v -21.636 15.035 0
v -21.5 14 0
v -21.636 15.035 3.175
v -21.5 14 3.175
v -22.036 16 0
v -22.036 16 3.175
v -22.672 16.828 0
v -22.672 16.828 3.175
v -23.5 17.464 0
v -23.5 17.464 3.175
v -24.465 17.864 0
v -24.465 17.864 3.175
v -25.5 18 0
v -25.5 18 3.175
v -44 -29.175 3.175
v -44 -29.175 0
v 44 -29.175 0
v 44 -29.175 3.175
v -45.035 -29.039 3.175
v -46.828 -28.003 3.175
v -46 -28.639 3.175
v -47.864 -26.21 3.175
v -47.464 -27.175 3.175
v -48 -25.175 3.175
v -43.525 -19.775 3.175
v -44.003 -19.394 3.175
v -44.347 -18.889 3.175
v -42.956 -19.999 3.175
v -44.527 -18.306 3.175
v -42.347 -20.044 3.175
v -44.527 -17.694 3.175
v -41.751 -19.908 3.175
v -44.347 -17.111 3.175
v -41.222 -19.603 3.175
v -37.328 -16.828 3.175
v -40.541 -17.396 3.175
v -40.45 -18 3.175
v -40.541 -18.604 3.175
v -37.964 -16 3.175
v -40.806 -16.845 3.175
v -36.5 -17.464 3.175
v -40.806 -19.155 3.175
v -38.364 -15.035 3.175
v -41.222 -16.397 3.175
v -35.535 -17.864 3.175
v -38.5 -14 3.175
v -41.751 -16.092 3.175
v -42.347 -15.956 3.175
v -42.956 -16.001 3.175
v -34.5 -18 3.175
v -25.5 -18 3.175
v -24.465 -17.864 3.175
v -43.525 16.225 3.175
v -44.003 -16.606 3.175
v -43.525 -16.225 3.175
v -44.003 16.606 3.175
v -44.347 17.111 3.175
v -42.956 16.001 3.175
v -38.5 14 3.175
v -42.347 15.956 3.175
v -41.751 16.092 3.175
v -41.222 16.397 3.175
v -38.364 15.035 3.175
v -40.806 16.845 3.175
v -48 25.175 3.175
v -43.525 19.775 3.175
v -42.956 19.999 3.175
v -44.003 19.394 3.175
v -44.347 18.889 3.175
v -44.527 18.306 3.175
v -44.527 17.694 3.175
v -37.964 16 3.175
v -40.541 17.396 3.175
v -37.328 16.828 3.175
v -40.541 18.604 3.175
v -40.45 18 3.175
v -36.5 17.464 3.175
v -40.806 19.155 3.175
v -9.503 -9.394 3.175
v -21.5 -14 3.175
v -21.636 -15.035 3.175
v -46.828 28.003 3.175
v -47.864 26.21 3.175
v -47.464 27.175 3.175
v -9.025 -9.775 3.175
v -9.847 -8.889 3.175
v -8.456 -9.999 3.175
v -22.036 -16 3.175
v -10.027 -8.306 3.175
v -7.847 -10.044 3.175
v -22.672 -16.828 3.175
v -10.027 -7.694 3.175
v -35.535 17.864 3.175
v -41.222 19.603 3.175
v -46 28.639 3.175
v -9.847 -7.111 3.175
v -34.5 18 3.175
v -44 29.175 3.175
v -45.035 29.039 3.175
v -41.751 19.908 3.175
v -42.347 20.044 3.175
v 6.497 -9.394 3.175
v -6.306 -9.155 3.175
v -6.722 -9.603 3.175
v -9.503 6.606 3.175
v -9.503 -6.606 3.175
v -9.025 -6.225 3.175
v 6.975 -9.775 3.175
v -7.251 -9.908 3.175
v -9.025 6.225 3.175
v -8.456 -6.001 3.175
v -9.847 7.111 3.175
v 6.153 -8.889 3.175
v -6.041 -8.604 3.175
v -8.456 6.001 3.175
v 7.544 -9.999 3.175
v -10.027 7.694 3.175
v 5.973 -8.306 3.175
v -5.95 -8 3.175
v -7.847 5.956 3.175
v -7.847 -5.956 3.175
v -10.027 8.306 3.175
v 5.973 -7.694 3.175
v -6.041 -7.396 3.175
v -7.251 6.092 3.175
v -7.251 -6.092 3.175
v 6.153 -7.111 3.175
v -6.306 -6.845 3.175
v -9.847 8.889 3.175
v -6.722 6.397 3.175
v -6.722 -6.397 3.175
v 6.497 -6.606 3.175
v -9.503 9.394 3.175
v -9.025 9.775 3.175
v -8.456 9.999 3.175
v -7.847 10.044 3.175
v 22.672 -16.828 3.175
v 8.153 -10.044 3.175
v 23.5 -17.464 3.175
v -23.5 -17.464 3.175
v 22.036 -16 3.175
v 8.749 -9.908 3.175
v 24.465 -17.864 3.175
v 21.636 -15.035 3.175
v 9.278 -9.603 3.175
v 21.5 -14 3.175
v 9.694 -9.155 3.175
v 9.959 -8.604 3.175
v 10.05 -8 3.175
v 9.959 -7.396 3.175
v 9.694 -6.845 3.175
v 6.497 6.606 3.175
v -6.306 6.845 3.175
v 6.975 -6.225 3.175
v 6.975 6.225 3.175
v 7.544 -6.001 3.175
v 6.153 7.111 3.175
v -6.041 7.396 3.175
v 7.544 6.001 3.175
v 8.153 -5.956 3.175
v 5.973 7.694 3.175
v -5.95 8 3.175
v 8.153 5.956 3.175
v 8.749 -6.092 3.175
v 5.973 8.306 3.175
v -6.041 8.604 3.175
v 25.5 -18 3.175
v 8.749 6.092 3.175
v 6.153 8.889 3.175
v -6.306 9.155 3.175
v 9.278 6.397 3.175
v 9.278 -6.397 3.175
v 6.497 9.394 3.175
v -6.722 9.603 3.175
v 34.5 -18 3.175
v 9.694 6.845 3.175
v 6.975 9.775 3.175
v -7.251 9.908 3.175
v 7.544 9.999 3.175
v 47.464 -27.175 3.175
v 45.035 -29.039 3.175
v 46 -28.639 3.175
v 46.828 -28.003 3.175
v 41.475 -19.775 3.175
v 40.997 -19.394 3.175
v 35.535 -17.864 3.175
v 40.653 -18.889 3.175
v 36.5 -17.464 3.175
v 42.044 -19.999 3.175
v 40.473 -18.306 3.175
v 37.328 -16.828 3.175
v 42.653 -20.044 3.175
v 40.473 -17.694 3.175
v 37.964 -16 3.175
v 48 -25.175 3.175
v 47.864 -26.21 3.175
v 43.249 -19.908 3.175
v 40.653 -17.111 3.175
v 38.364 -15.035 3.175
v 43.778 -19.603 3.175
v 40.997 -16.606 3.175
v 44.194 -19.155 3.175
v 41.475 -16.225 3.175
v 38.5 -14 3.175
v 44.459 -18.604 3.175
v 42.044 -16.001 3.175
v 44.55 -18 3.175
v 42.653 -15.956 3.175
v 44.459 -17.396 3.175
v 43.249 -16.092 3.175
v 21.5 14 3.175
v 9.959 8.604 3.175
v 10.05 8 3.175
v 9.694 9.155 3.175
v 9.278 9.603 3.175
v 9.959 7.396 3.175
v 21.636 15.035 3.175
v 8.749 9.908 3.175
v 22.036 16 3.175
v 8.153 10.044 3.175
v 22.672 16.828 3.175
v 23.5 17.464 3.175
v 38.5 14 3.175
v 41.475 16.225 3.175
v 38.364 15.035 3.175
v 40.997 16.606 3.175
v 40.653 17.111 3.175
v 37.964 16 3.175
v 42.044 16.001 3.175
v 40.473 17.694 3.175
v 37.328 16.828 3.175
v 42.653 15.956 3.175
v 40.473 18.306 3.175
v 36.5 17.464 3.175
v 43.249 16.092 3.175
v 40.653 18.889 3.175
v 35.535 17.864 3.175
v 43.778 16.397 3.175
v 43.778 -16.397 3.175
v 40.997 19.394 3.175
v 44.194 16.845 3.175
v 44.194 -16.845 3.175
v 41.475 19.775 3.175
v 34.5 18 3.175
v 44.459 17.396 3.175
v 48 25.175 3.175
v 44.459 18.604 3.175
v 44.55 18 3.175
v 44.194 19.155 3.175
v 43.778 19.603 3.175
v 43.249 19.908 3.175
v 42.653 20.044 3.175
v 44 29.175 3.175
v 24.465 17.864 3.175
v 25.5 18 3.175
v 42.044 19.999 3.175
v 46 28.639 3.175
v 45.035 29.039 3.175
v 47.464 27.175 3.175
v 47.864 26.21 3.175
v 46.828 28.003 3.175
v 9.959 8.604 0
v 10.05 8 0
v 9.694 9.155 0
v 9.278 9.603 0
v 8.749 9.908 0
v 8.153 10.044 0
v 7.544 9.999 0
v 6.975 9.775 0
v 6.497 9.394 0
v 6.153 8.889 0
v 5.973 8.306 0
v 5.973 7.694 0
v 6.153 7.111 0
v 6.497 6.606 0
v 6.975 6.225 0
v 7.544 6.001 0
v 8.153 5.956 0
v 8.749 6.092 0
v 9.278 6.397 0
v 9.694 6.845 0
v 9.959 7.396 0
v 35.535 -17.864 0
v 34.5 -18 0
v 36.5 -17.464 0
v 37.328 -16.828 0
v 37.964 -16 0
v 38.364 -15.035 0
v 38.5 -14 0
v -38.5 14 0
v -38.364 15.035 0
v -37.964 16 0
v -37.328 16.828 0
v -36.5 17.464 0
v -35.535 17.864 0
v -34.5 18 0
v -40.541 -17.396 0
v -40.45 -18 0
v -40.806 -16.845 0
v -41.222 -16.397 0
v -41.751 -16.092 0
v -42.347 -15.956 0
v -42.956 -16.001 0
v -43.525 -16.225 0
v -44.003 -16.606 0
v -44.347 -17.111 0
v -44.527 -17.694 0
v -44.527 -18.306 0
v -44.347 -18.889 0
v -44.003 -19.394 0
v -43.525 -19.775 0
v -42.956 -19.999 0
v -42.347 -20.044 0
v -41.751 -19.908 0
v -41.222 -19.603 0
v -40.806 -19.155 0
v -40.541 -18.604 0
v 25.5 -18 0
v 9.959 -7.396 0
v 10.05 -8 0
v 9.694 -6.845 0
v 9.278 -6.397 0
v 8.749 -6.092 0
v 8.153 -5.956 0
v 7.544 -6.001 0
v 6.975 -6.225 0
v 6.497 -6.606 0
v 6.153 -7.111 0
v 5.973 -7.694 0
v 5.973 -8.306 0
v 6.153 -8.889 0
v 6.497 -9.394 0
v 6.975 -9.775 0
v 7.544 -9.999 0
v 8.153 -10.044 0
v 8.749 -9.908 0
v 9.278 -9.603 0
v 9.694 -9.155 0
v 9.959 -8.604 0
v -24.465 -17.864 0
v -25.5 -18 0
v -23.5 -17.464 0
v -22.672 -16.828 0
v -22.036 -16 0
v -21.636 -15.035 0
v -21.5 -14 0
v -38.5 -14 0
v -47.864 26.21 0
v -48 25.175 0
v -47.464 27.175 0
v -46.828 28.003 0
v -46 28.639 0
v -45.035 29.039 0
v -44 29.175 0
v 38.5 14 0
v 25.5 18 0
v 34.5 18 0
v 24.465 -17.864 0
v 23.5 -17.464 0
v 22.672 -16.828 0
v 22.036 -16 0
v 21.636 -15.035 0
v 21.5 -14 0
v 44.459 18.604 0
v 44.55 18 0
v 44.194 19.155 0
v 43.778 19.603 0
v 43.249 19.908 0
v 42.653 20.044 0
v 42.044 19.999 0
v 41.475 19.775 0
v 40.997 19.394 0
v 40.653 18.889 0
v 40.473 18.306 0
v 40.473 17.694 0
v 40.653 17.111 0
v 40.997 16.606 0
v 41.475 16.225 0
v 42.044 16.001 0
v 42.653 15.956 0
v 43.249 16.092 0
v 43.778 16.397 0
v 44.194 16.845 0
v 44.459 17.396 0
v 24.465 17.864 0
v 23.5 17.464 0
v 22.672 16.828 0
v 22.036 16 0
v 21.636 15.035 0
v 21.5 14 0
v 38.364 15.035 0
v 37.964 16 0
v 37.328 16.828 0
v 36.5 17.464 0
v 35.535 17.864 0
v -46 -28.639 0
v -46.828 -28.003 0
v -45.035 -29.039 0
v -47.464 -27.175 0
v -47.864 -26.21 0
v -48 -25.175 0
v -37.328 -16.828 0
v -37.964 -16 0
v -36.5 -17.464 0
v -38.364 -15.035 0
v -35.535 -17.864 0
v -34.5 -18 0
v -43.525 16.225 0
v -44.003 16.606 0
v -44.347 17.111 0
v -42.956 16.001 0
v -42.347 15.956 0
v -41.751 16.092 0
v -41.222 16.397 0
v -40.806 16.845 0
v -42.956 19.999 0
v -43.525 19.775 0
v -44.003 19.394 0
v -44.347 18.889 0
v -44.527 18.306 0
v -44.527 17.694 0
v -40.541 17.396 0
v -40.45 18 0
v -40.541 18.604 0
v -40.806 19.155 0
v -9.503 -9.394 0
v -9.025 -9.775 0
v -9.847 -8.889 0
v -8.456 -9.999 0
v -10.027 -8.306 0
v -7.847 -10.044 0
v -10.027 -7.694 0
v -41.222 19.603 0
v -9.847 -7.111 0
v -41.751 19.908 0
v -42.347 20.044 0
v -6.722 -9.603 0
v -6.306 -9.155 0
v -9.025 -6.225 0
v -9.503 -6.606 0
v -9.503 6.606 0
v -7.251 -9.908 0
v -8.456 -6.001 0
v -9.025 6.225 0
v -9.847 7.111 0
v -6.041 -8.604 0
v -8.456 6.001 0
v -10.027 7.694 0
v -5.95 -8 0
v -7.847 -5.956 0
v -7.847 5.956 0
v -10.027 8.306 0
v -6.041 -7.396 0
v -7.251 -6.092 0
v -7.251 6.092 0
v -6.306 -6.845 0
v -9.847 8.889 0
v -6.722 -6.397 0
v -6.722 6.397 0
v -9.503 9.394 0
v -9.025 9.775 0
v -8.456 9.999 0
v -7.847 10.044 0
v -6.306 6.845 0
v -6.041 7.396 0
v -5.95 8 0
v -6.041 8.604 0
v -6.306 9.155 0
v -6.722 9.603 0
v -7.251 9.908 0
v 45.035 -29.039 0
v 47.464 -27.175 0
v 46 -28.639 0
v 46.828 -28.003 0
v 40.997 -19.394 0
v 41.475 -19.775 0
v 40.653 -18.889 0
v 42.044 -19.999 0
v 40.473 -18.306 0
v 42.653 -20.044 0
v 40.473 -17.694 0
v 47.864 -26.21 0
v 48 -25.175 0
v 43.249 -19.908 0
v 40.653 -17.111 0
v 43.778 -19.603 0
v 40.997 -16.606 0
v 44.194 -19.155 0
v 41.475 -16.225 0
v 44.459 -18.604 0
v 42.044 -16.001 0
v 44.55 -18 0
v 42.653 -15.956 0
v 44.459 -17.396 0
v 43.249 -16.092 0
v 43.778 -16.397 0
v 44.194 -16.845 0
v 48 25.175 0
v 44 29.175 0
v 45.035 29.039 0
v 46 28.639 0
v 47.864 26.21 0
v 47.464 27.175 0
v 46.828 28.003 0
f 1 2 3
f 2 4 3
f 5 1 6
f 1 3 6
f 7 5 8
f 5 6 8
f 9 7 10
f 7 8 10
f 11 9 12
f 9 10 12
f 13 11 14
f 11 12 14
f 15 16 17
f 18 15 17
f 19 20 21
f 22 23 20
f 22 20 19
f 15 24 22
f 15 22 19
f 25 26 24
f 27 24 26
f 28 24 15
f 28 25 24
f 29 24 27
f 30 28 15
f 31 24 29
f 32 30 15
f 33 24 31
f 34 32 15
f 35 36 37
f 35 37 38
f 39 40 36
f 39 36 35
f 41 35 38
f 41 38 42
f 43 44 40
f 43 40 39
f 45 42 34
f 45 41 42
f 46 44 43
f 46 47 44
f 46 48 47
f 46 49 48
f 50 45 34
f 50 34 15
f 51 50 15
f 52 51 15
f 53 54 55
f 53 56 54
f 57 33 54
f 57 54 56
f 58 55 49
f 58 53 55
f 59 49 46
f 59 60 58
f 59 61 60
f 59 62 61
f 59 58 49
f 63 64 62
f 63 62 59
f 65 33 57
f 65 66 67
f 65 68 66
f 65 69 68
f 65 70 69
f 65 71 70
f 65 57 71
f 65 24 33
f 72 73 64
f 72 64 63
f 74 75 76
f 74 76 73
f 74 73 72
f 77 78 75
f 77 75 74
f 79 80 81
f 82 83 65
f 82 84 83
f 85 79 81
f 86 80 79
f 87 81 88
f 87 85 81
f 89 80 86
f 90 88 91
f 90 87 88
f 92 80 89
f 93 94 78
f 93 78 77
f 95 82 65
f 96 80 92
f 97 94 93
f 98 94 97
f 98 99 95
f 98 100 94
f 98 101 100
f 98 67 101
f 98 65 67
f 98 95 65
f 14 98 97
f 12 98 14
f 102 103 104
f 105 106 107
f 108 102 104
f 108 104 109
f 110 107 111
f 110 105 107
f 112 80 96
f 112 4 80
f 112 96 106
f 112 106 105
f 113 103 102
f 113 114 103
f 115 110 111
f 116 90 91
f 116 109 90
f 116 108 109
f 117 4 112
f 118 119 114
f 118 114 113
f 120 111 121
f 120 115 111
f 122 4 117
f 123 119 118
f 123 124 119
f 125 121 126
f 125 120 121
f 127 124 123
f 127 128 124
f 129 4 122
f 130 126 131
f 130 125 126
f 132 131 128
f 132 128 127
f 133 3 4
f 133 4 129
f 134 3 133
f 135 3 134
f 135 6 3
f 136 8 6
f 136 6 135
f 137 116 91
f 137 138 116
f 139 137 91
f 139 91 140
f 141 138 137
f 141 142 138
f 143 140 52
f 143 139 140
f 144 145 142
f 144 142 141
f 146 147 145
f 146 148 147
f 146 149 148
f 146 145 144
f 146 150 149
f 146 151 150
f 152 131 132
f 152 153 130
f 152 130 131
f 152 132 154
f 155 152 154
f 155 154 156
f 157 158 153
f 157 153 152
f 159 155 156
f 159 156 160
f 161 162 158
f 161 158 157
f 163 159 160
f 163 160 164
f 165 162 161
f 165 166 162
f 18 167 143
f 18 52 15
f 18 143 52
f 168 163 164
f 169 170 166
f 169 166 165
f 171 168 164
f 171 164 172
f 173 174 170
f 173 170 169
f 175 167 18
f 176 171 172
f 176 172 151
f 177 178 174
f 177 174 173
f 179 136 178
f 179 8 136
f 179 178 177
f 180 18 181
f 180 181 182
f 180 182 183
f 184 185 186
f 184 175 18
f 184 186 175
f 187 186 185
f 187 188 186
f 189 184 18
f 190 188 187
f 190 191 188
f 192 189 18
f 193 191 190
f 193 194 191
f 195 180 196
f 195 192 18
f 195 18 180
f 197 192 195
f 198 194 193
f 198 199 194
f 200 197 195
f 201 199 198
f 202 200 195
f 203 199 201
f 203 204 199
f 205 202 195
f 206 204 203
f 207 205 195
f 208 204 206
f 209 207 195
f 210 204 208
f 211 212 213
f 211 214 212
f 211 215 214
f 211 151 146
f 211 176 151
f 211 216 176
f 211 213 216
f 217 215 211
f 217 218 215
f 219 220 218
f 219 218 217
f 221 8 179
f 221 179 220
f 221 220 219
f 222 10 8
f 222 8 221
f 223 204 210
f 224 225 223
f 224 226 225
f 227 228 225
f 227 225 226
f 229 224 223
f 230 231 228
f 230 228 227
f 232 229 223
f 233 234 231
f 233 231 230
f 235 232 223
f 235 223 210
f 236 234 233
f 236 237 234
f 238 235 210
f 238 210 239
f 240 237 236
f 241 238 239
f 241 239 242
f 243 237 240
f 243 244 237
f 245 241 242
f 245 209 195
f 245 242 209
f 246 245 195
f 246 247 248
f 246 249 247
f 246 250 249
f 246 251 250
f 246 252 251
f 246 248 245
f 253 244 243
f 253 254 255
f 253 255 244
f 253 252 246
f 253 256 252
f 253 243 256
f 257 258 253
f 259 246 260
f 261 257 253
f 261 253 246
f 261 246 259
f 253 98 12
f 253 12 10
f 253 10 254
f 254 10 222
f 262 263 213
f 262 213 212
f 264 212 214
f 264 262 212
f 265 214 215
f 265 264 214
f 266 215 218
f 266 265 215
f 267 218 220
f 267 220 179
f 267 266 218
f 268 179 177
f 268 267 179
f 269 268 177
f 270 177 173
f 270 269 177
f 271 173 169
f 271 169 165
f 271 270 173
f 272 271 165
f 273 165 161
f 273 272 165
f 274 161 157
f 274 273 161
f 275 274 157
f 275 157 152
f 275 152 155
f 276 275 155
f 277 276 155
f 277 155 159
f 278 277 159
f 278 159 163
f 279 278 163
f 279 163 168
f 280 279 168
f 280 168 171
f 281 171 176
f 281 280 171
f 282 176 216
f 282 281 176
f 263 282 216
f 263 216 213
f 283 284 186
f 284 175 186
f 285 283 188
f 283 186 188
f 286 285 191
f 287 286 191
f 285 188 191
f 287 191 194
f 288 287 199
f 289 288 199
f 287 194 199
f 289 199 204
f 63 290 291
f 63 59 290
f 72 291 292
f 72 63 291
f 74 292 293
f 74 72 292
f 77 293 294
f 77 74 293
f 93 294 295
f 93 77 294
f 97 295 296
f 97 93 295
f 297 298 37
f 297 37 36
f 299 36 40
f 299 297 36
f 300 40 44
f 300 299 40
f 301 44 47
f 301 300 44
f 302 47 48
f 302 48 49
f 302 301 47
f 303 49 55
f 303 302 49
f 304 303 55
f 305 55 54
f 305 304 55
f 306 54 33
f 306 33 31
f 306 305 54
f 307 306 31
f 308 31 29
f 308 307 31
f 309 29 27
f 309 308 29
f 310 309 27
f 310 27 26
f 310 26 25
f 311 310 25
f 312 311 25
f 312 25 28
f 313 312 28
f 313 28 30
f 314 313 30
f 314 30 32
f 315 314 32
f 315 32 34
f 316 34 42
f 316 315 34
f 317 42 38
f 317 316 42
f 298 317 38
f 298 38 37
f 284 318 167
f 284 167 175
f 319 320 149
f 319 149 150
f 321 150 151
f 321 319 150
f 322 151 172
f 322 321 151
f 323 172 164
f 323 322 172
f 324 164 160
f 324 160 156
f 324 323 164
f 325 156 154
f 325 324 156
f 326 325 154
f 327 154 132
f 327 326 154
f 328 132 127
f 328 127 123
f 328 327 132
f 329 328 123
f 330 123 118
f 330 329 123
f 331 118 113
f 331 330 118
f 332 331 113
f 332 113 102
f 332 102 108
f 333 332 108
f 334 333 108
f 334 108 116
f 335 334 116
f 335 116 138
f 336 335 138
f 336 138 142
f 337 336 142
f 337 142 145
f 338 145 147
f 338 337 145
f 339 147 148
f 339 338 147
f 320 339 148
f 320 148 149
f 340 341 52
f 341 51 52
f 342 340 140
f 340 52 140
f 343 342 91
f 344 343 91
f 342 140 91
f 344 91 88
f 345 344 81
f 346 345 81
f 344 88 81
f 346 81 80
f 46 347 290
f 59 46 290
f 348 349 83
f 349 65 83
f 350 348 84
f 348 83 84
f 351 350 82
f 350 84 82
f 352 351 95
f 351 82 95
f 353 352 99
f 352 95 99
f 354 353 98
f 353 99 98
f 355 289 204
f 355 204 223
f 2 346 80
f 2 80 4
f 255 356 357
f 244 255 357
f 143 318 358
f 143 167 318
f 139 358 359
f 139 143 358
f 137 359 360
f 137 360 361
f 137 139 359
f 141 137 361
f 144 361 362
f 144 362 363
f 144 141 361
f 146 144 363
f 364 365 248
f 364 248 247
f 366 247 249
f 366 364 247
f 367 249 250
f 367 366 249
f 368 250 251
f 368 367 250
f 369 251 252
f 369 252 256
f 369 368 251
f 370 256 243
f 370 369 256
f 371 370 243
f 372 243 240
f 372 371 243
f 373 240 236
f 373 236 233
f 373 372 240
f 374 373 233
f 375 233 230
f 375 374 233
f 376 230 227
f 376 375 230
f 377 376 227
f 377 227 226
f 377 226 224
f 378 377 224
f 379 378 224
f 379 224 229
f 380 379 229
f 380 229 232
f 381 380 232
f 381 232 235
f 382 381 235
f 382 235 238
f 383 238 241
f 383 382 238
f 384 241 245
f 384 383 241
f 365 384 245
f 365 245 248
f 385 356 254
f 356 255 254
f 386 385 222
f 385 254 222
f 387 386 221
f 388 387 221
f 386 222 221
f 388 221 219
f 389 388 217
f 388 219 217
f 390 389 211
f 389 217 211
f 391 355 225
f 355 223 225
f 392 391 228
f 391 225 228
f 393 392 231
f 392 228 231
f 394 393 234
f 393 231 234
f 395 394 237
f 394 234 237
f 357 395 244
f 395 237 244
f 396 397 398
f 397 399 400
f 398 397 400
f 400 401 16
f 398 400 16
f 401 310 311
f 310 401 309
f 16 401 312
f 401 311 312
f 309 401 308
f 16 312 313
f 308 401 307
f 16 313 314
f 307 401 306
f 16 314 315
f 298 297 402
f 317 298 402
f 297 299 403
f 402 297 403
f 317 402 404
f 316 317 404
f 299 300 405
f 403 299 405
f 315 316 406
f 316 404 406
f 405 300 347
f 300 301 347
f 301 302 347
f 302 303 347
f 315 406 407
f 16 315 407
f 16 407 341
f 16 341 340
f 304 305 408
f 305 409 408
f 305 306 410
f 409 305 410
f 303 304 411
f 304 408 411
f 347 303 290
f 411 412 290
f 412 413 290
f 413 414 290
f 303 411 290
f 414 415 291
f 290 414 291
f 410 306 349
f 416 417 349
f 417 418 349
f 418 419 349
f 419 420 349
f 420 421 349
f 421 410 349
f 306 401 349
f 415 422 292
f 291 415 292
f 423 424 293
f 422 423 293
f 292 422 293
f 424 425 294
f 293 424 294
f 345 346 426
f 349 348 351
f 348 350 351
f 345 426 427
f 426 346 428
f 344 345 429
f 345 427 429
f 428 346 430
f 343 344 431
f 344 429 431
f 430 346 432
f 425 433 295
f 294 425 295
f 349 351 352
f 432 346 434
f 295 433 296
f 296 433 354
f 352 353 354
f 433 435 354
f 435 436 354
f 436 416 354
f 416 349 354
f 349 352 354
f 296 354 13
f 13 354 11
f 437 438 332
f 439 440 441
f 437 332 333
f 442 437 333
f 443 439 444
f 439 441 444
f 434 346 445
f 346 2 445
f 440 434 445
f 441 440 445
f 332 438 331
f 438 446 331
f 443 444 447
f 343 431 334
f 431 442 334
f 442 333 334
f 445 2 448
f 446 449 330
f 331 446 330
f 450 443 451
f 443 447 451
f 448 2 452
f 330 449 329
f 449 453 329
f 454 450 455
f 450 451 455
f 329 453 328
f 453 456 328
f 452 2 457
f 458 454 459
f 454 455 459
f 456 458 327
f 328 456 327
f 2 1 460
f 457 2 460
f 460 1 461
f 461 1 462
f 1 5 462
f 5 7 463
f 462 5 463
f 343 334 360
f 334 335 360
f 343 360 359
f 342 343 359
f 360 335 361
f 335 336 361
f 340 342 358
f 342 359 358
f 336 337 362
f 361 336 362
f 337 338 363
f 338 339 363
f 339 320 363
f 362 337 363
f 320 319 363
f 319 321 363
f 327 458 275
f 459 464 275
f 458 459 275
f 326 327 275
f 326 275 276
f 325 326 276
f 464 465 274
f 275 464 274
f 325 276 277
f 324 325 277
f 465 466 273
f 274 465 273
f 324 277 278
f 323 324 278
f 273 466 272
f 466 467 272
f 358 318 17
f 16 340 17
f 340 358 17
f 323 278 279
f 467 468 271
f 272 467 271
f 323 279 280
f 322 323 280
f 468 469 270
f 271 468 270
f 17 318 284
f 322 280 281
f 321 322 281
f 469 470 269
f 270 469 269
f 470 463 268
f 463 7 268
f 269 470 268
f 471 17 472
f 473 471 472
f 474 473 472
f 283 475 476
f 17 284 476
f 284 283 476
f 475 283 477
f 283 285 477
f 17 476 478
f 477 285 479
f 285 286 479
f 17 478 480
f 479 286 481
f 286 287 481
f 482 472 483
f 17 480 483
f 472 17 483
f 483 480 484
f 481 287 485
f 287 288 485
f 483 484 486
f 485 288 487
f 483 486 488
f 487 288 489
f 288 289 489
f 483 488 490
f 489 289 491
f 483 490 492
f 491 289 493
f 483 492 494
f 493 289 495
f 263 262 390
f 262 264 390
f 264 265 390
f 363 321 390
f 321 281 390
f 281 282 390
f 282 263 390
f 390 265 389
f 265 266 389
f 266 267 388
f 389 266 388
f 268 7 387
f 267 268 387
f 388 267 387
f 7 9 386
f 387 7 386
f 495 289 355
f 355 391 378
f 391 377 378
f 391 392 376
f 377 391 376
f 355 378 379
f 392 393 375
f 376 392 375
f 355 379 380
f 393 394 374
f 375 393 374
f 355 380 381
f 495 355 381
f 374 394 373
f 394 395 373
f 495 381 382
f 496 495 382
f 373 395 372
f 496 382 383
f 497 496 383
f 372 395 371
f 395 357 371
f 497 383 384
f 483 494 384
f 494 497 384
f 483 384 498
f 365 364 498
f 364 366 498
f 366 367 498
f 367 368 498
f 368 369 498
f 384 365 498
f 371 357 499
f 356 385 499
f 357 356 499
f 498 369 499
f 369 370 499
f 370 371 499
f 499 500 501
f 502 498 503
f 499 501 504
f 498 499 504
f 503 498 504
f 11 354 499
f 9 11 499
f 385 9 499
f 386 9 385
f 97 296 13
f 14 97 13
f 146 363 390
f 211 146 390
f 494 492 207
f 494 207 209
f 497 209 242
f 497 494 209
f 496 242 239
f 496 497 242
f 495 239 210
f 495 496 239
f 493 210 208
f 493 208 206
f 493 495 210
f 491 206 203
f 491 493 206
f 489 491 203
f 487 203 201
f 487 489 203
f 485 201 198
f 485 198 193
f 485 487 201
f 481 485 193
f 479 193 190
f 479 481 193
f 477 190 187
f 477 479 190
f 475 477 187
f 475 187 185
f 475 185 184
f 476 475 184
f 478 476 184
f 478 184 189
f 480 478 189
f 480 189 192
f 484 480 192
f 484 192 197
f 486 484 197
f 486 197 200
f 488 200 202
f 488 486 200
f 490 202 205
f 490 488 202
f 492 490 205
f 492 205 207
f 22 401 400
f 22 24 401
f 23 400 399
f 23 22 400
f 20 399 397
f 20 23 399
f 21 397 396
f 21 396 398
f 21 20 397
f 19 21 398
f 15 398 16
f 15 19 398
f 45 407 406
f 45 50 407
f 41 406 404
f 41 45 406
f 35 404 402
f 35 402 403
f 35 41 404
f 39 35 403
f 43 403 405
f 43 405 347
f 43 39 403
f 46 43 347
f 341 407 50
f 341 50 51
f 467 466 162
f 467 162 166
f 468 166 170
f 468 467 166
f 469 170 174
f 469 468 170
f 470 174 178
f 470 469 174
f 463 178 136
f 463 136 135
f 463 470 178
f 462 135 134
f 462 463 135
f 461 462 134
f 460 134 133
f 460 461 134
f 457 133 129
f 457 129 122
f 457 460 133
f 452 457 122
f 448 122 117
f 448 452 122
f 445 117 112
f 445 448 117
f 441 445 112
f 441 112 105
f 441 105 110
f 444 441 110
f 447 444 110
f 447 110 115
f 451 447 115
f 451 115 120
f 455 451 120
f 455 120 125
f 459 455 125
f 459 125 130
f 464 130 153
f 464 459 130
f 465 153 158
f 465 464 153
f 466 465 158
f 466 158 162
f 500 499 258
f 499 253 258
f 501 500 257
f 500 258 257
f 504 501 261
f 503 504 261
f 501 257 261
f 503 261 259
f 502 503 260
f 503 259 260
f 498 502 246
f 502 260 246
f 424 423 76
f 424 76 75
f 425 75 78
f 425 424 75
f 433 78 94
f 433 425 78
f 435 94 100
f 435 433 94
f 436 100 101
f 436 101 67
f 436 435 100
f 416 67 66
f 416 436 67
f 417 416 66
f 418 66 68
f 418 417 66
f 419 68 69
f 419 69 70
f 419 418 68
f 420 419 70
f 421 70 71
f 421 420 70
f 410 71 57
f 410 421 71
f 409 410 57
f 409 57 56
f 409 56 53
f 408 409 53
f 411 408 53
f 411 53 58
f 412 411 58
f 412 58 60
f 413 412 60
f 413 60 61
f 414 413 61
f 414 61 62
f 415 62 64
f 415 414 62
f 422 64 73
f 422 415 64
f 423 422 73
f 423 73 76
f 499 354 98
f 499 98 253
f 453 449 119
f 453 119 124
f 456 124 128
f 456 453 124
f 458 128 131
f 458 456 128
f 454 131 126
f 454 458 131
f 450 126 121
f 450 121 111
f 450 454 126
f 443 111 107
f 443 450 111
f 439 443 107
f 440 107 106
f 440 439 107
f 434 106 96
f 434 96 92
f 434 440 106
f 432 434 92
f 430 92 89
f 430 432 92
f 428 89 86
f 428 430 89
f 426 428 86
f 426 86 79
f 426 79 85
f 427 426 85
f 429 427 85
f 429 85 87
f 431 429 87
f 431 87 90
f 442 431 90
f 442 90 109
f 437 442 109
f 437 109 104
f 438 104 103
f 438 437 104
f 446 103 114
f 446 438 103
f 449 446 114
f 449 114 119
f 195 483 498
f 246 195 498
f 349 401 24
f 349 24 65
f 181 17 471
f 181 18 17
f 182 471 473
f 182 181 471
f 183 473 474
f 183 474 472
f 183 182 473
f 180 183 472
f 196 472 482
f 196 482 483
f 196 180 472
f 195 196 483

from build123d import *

# Parameters (mm, degrees)
SKETCH1_W           = 96
SKETCH1_H           = 58.35
SKETCH1_R           = 2.05
SKETCH1_W_2         = 17
SKETCH1_H_2         = 36
BOSS_EXTRUDE1_DEPTH = 3.175
FILLET1_R           = 4


with BuildPart() as part:
    # Sketch1 → Boss-Extrude1 (new body)
    with BuildSketch(Plane.XY):
        Rectangle(SKETCH1_W, SKETCH1_H)
        with Locations((-42.5, 18)):
            Circle(SKETCH1_R, mode=Mode.SUBTRACT)
        with Locations((-42.5, -18)):
            Circle(SKETCH1_R, mode=Mode.SUBTRACT)
        with Locations((42.5, 18)):
            Circle(SKETCH1_R, mode=Mode.SUBTRACT)
        with Locations((42.5, -18)):
            Circle(SKETCH1_R, mode=Mode.SUBTRACT)
        with Locations((8, -8)):
            Circle(SKETCH1_R, mode=Mode.SUBTRACT)
        with Locations((-8, -8)):
            Circle(SKETCH1_R, mode=Mode.SUBTRACT)
        with Locations((-8, 8)):
            Circle(SKETCH1_R, mode=Mode.SUBTRACT)
        with Locations((8, 8)):
            Circle(SKETCH1_R, mode=Mode.SUBTRACT)
        with Locations((-30, 0)):
            Rectangle(SKETCH1_W_2, SKETCH1_H_2, mode=Mode.SUBTRACT)
        with Locations((30, 0)):
            Rectangle(SKETCH1_W_2, SKETCH1_H_2, mode=Mode.SUBTRACT)
    extrude(amount=BOSS_EXTRUDE1_DEPTH)

    # Fillet1
    fillet1_edges = [part.edges().sort_by_distance(p)[0] for p in [
        (-21.5, 18, 1.5875),
        (-38.5, 18, 1.5875),
        (-38.5, -18, 1.5875),
        (-21.5, -18, 1.5875),
        (21.5, -18, 1.5875),
        (38.5, -18, 1.5875),
        (38.5, 18, 1.5875),
        (21.5, 18, 1.5875),
        (-48, 29.175, 1.5875),
        (48, 29.175, 1.5875),
        (48, -29.175, 1.5875),
        (-48, -29.175, 1.5875),
    ]]
    fillet(fillet1_edges, radius=FILLET1_R)


solid = part.part
